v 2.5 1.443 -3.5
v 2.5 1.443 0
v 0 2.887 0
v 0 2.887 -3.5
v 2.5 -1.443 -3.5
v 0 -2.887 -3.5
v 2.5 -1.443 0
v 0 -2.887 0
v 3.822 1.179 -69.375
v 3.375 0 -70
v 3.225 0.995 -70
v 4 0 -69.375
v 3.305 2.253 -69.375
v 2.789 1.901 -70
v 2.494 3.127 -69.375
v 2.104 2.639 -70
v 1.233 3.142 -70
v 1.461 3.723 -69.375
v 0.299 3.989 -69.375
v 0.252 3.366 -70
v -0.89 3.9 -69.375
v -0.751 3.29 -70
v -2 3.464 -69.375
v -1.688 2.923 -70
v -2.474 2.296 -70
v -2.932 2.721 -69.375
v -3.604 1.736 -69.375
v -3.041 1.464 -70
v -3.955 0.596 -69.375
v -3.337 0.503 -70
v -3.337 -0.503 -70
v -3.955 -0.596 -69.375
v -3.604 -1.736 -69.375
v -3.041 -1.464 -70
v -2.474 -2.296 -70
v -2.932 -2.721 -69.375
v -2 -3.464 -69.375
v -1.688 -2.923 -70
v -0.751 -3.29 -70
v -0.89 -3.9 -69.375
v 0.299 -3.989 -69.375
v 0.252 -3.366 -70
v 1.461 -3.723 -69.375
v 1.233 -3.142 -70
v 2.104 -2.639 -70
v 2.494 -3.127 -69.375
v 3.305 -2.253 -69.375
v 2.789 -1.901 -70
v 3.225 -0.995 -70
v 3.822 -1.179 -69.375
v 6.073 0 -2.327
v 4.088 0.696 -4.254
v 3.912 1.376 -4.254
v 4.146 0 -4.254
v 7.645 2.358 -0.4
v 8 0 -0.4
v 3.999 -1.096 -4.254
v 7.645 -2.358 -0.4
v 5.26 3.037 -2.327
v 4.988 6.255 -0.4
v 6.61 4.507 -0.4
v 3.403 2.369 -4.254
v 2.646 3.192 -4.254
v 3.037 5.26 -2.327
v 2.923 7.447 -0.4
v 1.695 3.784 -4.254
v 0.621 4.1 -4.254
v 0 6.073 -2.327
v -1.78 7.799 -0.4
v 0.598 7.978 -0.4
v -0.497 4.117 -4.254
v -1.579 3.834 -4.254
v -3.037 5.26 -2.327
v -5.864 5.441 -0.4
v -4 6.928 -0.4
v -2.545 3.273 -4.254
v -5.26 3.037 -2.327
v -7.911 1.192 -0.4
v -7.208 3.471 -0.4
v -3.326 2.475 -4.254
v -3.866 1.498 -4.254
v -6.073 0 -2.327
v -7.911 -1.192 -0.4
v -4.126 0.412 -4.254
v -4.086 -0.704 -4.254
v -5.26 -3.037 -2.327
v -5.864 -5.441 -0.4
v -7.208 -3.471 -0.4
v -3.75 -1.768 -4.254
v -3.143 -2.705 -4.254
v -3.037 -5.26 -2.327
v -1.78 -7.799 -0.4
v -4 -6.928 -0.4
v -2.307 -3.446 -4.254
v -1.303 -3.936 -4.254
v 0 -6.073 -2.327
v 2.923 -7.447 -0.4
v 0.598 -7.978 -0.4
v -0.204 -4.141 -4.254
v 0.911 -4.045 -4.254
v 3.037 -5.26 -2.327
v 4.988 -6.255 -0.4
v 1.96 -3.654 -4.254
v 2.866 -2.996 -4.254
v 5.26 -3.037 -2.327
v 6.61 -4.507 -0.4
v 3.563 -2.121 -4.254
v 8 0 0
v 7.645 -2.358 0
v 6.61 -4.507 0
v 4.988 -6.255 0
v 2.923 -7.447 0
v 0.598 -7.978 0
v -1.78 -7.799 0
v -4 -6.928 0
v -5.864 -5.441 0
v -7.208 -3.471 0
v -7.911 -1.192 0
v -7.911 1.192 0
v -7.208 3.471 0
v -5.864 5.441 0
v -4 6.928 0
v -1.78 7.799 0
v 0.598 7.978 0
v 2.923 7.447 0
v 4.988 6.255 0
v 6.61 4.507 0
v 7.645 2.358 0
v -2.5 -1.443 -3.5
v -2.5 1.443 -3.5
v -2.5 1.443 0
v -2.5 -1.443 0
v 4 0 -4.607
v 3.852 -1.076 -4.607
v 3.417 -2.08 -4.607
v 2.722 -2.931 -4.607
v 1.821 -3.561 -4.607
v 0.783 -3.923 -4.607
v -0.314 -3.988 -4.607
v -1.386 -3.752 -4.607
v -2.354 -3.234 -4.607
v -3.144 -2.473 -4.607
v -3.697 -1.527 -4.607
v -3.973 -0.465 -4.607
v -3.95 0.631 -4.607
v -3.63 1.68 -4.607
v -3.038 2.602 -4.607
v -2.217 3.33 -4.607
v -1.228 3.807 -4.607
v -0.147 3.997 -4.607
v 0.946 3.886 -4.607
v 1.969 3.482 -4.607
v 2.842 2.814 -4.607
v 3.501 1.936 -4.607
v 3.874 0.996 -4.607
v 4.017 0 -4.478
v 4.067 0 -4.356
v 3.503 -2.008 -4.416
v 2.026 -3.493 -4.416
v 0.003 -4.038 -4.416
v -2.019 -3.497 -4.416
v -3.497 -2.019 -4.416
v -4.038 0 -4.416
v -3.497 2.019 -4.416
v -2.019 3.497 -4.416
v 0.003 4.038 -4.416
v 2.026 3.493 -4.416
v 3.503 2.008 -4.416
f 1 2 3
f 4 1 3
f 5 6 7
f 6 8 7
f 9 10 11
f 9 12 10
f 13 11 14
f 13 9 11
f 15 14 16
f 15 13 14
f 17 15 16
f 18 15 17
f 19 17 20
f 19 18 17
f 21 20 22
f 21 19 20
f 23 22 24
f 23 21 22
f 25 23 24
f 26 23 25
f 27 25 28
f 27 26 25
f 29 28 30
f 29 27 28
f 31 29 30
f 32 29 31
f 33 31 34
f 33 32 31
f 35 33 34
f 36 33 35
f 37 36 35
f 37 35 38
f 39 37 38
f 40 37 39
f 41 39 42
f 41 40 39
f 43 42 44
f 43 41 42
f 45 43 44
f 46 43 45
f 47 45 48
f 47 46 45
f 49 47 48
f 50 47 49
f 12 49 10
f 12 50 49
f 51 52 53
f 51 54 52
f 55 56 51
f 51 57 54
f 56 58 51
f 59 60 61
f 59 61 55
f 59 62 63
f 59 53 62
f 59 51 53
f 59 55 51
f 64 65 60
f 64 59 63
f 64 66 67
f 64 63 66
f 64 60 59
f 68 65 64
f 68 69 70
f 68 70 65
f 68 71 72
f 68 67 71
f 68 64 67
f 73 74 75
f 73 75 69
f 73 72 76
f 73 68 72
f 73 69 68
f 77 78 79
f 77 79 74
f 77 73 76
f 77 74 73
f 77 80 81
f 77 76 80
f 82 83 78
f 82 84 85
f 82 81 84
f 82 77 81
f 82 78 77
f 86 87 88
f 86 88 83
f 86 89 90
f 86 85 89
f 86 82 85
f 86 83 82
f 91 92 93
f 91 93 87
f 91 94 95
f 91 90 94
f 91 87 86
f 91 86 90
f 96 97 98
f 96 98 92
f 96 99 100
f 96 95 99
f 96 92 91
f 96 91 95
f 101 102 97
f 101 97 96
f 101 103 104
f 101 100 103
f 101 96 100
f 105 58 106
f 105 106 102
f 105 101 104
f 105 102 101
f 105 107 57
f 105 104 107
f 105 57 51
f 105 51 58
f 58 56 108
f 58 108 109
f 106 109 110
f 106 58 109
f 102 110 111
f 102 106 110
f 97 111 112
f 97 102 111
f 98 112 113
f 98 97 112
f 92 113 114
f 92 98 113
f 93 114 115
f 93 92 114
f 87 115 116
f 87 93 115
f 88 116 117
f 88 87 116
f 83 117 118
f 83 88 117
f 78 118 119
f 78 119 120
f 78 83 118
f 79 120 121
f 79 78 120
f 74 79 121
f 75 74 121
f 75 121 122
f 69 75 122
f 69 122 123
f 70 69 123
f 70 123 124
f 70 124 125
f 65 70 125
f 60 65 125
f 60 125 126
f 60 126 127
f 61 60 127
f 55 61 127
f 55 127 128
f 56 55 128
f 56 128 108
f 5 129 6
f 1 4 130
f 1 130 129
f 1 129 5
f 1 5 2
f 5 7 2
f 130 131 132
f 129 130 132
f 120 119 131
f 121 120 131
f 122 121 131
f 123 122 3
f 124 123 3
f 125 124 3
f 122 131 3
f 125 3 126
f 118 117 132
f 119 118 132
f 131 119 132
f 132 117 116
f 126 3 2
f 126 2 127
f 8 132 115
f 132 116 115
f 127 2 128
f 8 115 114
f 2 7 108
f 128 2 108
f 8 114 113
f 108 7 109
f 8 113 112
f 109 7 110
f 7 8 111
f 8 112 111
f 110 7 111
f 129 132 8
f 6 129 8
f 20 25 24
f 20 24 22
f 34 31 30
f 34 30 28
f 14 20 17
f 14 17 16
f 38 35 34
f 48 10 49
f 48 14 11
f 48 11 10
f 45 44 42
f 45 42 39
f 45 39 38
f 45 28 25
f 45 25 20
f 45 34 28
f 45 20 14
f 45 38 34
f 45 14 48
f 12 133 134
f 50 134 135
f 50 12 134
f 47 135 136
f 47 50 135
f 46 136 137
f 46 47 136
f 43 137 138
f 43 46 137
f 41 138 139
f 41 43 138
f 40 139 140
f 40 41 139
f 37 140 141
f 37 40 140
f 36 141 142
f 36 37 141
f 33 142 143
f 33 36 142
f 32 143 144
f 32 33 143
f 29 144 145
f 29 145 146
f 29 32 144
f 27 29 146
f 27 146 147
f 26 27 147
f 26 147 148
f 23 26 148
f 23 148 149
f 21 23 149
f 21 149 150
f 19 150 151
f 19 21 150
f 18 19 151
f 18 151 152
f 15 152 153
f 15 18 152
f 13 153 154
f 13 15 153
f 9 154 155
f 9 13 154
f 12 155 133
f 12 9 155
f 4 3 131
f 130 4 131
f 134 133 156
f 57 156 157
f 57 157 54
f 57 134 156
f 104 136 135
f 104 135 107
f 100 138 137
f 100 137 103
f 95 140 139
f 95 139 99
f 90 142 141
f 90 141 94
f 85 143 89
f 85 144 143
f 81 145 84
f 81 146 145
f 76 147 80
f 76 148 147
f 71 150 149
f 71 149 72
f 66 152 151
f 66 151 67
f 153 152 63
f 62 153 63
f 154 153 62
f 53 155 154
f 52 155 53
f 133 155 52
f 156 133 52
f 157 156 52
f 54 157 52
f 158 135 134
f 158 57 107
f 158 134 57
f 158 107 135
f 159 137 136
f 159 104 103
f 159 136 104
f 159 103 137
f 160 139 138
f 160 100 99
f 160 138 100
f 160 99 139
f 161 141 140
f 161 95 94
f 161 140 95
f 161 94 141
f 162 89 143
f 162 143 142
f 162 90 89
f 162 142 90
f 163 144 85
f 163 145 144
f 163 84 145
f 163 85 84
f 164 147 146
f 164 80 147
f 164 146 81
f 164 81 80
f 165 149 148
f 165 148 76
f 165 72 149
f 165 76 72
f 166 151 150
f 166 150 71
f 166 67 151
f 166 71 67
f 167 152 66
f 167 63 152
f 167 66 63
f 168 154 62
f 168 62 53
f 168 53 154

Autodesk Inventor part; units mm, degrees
ref_plane "YZ Plane" through (0, 0, 0) normal (1, 0, 0) x (0, 1, 0)
sketch "Sketch1" plane through (0, 0, 0) normal (0, 1, 0) x (-1, 0, 0)
  point P0 (0, 0)
sketch "Sketch2" plane through (0, 0, 0) normal (0, 1, 0) x (-1, 0, 0)
  line L0 (-4, -70) -> (0, -70)
  line L1 (-4, -4.4) -> (-4, -70)
  line L2 (-8, -0.4) -> (-4, -4.4)
  line L3 (-8, 0) -> (-8, -0.4)
  line L4 (0, 0) -> (-8, 0)
  line L5 (0, -70) -> (0, 0)
  line L6 (0, -70) -> (0, 0)
  line L7 (0, -84) -> (0, 14) projected
  line L8 (1.6, 0) -> (-9.6, 0) projected
  dimension "d3" = 8
  dimension "d5" = 4
  dimension "d7" = 70
  dimension "ParC" = 0.4
  dimension "d22" = 0
  dimension "d23" = 0
  dimension "d43" = 45
revolve "Revolution1" add sketch "Sketch2" angle 360 about axis through (0, 0, -70) along (0, 0, -1)
sketch "Sketch3" plane through (0, 0, 0) normal (0, 0, 1) x (1, 0, 0)
  line L0 (-2.5, 1.4434) -> (-2.5, -1.4434)
  line L1 (0, 2.8868) -> (-2.5, 1.4434)
  line L2 (2.5, 1.4434) -> (0, 2.8868)
  line L3 (2.5, -1.4434) -> (2.5, 1.4434)
  line L4 (0, -2.8868) -> (2.5, -1.4434)
  line L5 (-2.5, -1.4434) -> (0, -2.8868)
  circle A0 centre (0, 0) radius 2.5 construction
  circle A1 centre (0, 0) radius 4 construction
  dimension "d11" = 5
  dimension "d13" = 120
  dimension "d15" = 120
extrude "Extrusion1" cut sketch "Sketch3" against normal blind 3.5
fillet "Fillet1" radius 0.5 1 edges at (-4, 0, -4.4)
chamfer "Chamfer1" distance 0.625 angle 45 1 edges at (-4, 0, -70) measured on face at (-0.9596, 3.8832, -48.2024)
thread "Thread1" size "M8x1.25" class "6g" standard "ISO Metric profile" full length
ref_plane "MSC_PF1" through (0, 0, 0) normal (1, 0, 0) x (0, 1, 0)
ref_plane "MSC_PT1" through (0, 0, 0) normal (0, 0, -1) x (-1, 0, 0)
equation "\"d3\" = 0.5 * dk"
equation "\"d5\" = 0.5 * NND"
equation "\"d43\" = 0.5 * ang"
equation "\"d18\" = r"
equation "\"d19\" = 0.5 * PTC"
equation "\"d39\" = 0.5 * PTC"
equation "\"d11\" = ParS"
equation "\"d16\" = ParT"
equation "\"NND\" = 8"
equation "\"PTC\" = 1.25"
equation "\"dk\" = 16"
equation "\"ParK\" = 4.4"
equation "\"ParS\" = 5"
equation "\"ParT\" = 3.5"
equation "\"r\" = 0.5"
equation "\"ang\" = 90deg"
equation "\"THREADDIA\" = NND"
properties part number "DIN 7991 - M8x60" material "Steel, Mild"
